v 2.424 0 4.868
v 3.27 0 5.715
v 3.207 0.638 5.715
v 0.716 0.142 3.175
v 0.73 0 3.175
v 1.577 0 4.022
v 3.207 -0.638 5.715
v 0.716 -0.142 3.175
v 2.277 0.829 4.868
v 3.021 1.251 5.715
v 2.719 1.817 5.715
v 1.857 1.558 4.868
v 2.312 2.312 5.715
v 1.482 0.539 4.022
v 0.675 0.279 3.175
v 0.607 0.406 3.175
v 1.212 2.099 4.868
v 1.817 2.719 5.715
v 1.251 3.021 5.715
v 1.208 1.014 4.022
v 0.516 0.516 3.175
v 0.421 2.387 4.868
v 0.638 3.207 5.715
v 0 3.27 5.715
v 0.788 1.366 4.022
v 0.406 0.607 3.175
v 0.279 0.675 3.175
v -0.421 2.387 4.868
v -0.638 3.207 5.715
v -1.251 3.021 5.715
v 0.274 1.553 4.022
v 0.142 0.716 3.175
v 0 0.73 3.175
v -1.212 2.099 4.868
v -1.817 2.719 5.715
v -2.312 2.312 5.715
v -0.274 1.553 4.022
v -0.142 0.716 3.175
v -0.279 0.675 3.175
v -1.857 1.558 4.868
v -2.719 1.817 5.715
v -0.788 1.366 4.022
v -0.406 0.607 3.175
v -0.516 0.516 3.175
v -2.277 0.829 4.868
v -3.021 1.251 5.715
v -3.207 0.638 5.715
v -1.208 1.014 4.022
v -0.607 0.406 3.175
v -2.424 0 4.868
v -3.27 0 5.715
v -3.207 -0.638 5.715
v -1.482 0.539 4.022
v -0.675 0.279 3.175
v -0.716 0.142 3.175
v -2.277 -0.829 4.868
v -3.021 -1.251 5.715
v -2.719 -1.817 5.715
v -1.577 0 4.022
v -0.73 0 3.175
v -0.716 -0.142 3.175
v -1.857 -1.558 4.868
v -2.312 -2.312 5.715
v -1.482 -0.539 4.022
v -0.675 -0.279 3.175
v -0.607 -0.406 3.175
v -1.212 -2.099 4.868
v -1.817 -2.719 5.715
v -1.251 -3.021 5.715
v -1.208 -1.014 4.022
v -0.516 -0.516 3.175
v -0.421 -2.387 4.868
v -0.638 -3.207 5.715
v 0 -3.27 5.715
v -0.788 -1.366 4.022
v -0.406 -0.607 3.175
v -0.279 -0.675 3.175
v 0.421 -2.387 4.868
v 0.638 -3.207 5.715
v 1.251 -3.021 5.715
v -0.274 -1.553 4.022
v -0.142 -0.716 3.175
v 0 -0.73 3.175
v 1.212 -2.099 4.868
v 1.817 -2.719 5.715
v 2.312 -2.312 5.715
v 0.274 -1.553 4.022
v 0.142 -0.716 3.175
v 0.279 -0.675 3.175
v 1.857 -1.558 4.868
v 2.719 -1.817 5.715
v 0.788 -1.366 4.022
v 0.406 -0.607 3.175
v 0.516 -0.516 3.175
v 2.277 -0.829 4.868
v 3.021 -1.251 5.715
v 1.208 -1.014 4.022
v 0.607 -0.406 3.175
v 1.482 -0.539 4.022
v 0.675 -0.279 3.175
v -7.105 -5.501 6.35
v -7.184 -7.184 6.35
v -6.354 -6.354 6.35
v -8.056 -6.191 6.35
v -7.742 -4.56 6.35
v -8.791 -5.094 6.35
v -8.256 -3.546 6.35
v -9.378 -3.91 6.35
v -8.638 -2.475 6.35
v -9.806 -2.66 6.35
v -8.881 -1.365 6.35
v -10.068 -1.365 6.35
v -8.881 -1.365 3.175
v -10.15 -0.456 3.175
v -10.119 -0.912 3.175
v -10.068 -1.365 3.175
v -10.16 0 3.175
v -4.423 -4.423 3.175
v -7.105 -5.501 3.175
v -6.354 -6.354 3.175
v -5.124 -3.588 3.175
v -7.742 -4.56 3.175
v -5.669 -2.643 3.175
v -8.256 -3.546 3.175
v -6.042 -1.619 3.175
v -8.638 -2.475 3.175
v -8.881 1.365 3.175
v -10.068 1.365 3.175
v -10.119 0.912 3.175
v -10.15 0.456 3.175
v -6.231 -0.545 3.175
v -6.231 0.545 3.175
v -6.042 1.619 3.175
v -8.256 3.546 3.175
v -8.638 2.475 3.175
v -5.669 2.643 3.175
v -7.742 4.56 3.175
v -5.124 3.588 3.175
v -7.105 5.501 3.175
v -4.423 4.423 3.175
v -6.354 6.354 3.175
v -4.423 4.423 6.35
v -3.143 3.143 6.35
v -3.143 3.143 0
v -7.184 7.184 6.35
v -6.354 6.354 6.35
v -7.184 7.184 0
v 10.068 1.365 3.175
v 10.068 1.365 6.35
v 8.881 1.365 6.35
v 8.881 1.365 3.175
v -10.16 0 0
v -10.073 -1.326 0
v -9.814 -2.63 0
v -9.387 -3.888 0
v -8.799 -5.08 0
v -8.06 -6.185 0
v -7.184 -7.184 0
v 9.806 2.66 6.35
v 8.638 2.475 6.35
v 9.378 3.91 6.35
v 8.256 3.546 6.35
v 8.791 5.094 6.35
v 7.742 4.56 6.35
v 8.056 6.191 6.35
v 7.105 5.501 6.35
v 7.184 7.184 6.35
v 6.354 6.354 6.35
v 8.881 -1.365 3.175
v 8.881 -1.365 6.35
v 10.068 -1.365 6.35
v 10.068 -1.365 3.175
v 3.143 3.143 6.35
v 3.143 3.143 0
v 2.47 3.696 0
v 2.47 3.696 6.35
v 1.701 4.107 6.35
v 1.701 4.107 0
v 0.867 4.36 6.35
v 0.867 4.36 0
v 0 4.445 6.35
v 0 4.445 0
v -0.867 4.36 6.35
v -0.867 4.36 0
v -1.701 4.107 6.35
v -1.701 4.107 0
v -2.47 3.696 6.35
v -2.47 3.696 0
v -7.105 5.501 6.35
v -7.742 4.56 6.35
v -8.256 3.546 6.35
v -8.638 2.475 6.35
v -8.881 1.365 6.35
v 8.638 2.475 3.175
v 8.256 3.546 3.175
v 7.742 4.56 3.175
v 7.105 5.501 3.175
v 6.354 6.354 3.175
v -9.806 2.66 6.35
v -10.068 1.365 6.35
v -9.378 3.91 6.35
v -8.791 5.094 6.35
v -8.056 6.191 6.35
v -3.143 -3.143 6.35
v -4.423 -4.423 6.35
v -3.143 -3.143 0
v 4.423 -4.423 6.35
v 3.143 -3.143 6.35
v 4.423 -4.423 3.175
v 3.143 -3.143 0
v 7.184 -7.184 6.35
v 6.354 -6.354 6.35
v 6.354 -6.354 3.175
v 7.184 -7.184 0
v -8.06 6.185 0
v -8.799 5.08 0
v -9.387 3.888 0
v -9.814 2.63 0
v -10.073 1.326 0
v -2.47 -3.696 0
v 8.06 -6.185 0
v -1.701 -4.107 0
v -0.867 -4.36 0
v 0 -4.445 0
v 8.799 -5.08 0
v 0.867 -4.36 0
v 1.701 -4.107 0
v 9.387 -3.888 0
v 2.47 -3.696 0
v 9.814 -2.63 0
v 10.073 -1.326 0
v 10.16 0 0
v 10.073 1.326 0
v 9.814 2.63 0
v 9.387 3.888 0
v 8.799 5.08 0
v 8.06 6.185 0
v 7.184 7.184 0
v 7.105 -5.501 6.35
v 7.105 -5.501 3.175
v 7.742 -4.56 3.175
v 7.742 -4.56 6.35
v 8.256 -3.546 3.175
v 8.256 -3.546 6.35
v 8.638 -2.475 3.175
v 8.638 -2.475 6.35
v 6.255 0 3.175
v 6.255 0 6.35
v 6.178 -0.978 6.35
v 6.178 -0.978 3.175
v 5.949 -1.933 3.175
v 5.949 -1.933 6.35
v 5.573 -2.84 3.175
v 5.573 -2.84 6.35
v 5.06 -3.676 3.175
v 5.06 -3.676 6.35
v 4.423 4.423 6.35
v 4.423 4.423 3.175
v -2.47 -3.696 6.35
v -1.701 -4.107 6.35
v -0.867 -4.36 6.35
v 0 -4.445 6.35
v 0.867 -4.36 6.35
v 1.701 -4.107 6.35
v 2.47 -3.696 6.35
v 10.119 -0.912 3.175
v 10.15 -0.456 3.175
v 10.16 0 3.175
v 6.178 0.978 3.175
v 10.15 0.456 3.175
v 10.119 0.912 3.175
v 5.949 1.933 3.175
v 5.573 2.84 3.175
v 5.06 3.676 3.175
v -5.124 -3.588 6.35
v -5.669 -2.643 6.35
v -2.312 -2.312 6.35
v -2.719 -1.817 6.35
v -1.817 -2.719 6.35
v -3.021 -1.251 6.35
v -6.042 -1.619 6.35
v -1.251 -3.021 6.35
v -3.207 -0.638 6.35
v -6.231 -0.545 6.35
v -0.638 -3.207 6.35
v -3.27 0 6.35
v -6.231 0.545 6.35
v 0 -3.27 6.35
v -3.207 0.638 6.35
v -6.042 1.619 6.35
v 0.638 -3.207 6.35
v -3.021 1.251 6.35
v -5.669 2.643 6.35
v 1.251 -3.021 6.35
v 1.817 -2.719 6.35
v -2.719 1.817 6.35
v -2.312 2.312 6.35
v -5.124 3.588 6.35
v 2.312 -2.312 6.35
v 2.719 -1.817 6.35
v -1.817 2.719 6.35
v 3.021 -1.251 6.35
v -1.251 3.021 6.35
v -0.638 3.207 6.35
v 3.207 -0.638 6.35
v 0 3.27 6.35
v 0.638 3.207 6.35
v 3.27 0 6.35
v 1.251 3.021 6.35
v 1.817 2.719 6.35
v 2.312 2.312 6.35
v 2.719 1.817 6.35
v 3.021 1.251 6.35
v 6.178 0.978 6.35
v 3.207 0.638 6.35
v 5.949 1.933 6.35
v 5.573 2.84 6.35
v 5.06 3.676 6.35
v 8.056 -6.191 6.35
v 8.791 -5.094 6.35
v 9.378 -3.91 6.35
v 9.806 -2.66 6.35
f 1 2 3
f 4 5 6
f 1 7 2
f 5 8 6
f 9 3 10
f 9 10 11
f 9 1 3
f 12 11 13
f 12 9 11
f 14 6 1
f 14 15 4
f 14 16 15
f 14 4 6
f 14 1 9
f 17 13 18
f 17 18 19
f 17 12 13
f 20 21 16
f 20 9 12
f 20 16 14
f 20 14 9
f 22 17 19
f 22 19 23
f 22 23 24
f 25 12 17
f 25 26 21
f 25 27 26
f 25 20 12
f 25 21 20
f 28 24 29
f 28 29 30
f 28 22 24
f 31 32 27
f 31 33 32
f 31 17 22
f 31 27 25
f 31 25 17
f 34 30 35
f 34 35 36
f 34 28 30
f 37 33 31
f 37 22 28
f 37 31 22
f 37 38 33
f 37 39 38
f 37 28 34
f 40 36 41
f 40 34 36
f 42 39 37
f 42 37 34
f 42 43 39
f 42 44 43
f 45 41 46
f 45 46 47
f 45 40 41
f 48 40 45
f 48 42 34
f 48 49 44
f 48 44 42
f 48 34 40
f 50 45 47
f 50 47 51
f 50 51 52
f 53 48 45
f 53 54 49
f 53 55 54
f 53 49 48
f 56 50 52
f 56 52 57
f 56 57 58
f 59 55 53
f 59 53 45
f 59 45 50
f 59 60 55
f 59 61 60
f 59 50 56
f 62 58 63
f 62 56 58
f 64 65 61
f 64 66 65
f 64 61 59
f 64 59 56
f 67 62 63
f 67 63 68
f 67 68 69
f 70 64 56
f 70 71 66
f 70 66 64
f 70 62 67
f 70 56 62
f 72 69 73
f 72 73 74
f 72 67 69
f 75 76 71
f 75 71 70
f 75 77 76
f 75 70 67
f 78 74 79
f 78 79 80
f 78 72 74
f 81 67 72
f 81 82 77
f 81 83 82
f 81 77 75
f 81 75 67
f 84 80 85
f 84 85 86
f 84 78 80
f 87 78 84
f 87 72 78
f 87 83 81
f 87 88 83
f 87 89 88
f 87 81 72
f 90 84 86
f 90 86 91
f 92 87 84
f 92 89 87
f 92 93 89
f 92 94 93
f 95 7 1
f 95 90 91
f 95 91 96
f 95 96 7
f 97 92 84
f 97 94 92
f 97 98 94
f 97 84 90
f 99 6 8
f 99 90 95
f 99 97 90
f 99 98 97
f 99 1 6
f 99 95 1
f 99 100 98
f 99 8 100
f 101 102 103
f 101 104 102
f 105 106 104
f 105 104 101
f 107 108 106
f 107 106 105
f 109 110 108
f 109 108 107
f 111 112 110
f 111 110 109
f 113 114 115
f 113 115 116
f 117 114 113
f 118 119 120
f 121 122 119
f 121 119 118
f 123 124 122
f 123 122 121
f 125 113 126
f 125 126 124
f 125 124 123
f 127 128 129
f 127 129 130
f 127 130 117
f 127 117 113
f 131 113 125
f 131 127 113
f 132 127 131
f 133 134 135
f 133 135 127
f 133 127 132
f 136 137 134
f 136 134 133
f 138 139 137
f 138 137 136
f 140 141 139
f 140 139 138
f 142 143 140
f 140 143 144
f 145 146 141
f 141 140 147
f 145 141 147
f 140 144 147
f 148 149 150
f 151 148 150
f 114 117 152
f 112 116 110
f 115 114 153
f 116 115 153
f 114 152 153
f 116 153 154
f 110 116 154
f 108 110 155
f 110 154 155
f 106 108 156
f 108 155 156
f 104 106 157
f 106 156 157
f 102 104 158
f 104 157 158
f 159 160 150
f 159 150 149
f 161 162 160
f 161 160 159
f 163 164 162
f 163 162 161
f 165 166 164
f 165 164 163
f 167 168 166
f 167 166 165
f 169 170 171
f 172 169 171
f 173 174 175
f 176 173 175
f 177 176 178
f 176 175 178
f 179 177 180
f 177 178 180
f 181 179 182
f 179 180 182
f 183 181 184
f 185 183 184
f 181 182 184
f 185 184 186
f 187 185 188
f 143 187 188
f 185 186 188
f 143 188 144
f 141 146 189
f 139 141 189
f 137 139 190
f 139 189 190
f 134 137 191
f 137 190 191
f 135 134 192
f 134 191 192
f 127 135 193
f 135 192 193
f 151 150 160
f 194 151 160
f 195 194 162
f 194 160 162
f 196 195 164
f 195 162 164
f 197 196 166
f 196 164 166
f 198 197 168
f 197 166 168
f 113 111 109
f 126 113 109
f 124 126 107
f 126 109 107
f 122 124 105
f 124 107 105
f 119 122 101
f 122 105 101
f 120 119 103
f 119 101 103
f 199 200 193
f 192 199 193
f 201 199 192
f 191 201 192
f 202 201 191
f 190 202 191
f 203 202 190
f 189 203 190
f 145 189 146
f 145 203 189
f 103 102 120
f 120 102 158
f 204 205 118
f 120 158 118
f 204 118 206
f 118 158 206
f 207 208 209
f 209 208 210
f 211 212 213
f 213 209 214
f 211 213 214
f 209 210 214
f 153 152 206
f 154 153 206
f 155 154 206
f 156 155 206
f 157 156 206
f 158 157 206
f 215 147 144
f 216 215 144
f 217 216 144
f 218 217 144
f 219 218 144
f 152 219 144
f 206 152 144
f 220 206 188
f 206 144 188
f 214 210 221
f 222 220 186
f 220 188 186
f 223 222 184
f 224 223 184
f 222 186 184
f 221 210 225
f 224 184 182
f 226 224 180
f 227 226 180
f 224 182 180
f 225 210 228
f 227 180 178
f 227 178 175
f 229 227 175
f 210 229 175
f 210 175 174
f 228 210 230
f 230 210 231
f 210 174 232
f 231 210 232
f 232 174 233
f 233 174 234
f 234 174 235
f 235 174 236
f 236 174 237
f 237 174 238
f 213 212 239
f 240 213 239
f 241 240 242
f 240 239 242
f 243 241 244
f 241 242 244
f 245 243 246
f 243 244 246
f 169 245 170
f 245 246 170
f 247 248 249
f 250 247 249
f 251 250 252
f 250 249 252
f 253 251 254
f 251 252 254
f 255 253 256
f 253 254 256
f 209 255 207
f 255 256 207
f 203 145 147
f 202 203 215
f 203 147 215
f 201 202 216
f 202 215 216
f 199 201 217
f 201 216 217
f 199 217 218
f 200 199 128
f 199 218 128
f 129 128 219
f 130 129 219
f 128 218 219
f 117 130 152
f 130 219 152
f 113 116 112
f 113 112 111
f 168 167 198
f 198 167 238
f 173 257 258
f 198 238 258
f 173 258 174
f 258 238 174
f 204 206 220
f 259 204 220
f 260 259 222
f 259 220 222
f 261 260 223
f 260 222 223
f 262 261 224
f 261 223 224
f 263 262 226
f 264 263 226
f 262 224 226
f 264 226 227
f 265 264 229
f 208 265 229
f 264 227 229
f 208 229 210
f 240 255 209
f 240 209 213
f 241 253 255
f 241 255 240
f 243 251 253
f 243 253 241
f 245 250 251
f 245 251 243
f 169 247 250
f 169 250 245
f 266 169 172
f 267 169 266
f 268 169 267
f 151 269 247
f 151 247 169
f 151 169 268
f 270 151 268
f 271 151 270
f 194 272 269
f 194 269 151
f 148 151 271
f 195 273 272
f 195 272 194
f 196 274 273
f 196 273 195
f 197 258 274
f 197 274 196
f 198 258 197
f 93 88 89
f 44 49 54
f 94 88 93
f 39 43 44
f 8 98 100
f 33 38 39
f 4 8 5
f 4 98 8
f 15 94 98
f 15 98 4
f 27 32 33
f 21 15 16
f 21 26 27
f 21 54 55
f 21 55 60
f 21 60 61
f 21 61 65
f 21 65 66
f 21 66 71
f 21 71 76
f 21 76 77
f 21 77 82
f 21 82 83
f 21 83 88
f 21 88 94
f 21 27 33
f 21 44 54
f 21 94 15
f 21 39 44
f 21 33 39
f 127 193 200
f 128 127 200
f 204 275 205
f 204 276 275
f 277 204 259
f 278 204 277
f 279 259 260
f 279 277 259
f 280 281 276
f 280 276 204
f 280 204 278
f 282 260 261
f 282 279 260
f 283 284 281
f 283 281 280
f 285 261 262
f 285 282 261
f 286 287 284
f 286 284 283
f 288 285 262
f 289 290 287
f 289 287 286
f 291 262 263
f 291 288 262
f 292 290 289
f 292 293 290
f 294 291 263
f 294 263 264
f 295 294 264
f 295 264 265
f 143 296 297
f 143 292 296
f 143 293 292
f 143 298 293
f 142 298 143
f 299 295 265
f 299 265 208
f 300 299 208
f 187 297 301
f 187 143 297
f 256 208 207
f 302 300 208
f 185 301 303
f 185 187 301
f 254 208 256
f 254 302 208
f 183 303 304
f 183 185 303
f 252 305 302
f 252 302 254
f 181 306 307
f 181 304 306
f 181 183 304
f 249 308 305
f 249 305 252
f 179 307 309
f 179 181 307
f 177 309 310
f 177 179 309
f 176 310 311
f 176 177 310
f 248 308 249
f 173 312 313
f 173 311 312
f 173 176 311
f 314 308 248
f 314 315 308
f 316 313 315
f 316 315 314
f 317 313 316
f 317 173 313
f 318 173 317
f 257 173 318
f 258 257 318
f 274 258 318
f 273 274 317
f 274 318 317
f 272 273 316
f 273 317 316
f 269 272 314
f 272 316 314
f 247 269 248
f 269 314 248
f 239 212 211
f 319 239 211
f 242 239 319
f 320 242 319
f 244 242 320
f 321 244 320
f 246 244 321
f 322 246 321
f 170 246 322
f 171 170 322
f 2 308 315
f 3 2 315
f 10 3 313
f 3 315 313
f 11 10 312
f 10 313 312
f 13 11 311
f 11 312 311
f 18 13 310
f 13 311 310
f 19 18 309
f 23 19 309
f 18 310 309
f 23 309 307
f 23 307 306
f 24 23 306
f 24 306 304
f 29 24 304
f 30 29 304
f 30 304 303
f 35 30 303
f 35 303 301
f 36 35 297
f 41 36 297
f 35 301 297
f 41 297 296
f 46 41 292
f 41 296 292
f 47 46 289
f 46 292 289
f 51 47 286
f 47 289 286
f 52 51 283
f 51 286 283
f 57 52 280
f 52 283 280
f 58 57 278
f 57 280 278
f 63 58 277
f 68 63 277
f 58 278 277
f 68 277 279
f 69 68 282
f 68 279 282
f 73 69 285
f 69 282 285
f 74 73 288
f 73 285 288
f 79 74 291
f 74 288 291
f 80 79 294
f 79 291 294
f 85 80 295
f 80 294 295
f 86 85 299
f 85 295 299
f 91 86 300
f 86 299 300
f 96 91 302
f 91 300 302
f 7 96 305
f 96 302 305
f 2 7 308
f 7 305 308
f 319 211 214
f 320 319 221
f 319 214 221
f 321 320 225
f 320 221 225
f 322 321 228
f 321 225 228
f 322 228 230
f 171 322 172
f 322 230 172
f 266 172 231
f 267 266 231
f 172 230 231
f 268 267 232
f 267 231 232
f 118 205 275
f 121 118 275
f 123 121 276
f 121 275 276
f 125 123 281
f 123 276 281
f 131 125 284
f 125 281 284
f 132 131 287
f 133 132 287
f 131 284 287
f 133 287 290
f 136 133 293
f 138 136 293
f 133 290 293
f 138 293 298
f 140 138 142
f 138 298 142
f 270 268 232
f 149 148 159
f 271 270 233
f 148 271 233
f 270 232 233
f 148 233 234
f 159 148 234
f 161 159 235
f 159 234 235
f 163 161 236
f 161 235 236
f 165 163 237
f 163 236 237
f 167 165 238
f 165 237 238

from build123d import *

# Parameters (mm, degrees)
F0_R     = 3.27025
F1_DEPTH = 6.35
F2_R     = 3.27025
F3_DEPTH = 3.175
F4_SIZE  = 2.54


# Not quite as in the source:
# - a feature names something its author has since deleted; it is built from what else it names


with BuildPart() as f1:
    # F0 (on Top) → F1 (new body)
    with BuildSketch(Plane.XY):
        with BuildLine():
            ThreePointArc((-4.445, 0), (-4.106644522, 1.7010278569), (-3.1430896424, 3.1430896424))
            Line((-3.1430896424, 3.1430896424), (-7.1842048969, 7.1842048969))
            ThreePointArc((-7.1842048969, 7.1842048969), (-9.3866160503, 3.8880636728), (-10.16, 0))
            ThreePointArc((-10.16, 0), (-9.3866160503, -3.8880636728), (-7.1842048969, -7.1842048969))
            Line((-7.1842048969, -7.1842048969), (-3.1430896424, -3.1430896424))
            ThreePointArc((-3.1430896424, -3.1430896424), (-4.106644522, -1.7010278569), (-4.445, 0))
        make_face()
        with BuildLine():
            ThreePointArc((3.1430896424, -3.1430896424), (4.106644522, -1.7010278569), (4.445, 0))
            ThreePointArc((4.445, 0), (4.106644522, 1.7010278569), (3.1430896424, 3.1430896424))
            ThreePointArc((3.1430896424, 3.1430896424), (0, 4.445), (-3.1430896424, 3.1430896424))
            ThreePointArc((-3.1430896424, 3.1430896424), (-4.106644522, 1.7010278569), (-4.445, 0))
            ThreePointArc((-4.445, 0), (-4.106644522, -1.7010278569), (-3.1430896424, -3.1430896424))
            ThreePointArc((-3.1430896424, -3.1430896424), (0, -4.445), (3.1430896424, -3.1430896424))
        make_face()
        Circle(F0_R, mode=Mode.SUBTRACT)
        with BuildLine():
            ThreePointArc((3.1430896424, 3.1430896424), (4.106644522, 1.7010278569), (4.445, 0))
            ThreePointArc((4.445, 0), (4.106644522, -1.7010278569), (3.1430896424, -3.1430896424))
            Line((3.1430896424, -3.1430896424), (7.1842048969, -7.1842048969))
            ThreePointArc((7.1842048969, -7.1842048969), (9.3866160503, -3.8880636728), (10.16, 0))
            ThreePointArc((10.16, 0), (9.3866160503, 3.8880636728), (7.1842048969, 7.1842048969))
            Line((7.1842048969, 7.1842048969), (3.1430896424, 3.1430896424))
        make_face()
        Circle(F0_R)
    extrude(amount=F1_DEPTH)

    # F2 (on face) → F3 (cut)
    with BuildSketch(Plane.XY.offset(6.35)):
        with BuildLine():
            ThreePointArc((-4.4227761396, -4.4227761396), (-6.25475, 0), (-4.4227761396, 4.4227761396))
            Line((-4.4227761396, 4.4227761396), (-6.3535312057, 6.3535312057))
            ThreePointArc((-6.3535312057, 6.3535312057), (-8.0151664506, 4.0610127224), (-8.8809239384, 1.36525))
            ThreePointArc((-8.8809239384, 1.36525), (-8.98525, 0), (-8.8809239384, -1.36525))
            ThreePointArc((-8.8809239384, -1.36525), (-8.0151664506, -4.0610127224), (-6.3535312057, -6.3535312057))
            Line((-6.3535312057, -6.3535312057), (-4.4227761396, -4.4227761396))
        make_face()
        with BuildLine():
            ThreePointArc((4.4227761396, 4.4227761396), (5.778635506, 2.3935891986), (6.25475, 0))
            ThreePointArc((6.25475, 0), (5.778635506, -2.3935891986), (4.4227761396, -4.4227761396))
            Line((4.4227761396, -4.4227761396), (6.3535312057, -6.3535312057))
            ThreePointArc((6.3535312057, -6.3535312057), (8.0151664506, -4.0610127224), (8.8809239384, -1.36525))
            ThreePointArc((8.8809239384, -1.36525), (8.9591305209, -0.6846151272), (8.98525, 0))
            ThreePointArc((8.98525, 0), (8.9591305209, 0.6846151272), (8.8809239384, 1.36525))
            ThreePointArc((8.8809239384, 1.36525), (8.0151664506, 4.0610127224), (6.3535312057, 6.3535312057))
            Line((6.3535312057, 6.3535312057), (4.4227761396, 4.4227761396))
        make_face()
        with BuildLine():
            ThreePointArc((-8.8809239384, -1.36525), (-8.98525, 0), (-8.8809239384, 1.36525))
            Line((-8.8809239384, 1.36525), (-10.0678544108, 1.36525))
            ThreePointArc((-10.0678544108, 1.36525), (-10.16, 0), (-10.0678544108, -1.36525))
            Line((-10.0678544108, -1.36525), (-8.8809239384, -1.36525))
        make_face()
        with BuildLine():
            Line((10.0678544108, 1.36525), (8.8809239384, 1.36525))
            ThreePointArc((8.8809239384, 1.36525), (8.9591305209, 0.6846151272), (8.98525, 0))
            ThreePointArc((8.98525, 0), (8.9591305209, -0.6846151272), (8.8809239384, -1.36525))
            Line((8.8809239384, -1.36525), (10.0678544108, -1.36525))
            ThreePointArc((10.0678544108, -1.36525), (10.16, 0), (10.0678544108, 1.36525))
        make_face()
        Circle(F2_R)
    extrude(amount=-F3_DEPTH, mode=Mode.SUBTRACT)

    # F4
    f4_edges = [f1.edges().sort_by_distance(p)[0] for p in [
        (-3.27025, 0, 3.175),
    ]]
    chamfer(f4_edges, length=F4_SIZE)


solid = f1.part
